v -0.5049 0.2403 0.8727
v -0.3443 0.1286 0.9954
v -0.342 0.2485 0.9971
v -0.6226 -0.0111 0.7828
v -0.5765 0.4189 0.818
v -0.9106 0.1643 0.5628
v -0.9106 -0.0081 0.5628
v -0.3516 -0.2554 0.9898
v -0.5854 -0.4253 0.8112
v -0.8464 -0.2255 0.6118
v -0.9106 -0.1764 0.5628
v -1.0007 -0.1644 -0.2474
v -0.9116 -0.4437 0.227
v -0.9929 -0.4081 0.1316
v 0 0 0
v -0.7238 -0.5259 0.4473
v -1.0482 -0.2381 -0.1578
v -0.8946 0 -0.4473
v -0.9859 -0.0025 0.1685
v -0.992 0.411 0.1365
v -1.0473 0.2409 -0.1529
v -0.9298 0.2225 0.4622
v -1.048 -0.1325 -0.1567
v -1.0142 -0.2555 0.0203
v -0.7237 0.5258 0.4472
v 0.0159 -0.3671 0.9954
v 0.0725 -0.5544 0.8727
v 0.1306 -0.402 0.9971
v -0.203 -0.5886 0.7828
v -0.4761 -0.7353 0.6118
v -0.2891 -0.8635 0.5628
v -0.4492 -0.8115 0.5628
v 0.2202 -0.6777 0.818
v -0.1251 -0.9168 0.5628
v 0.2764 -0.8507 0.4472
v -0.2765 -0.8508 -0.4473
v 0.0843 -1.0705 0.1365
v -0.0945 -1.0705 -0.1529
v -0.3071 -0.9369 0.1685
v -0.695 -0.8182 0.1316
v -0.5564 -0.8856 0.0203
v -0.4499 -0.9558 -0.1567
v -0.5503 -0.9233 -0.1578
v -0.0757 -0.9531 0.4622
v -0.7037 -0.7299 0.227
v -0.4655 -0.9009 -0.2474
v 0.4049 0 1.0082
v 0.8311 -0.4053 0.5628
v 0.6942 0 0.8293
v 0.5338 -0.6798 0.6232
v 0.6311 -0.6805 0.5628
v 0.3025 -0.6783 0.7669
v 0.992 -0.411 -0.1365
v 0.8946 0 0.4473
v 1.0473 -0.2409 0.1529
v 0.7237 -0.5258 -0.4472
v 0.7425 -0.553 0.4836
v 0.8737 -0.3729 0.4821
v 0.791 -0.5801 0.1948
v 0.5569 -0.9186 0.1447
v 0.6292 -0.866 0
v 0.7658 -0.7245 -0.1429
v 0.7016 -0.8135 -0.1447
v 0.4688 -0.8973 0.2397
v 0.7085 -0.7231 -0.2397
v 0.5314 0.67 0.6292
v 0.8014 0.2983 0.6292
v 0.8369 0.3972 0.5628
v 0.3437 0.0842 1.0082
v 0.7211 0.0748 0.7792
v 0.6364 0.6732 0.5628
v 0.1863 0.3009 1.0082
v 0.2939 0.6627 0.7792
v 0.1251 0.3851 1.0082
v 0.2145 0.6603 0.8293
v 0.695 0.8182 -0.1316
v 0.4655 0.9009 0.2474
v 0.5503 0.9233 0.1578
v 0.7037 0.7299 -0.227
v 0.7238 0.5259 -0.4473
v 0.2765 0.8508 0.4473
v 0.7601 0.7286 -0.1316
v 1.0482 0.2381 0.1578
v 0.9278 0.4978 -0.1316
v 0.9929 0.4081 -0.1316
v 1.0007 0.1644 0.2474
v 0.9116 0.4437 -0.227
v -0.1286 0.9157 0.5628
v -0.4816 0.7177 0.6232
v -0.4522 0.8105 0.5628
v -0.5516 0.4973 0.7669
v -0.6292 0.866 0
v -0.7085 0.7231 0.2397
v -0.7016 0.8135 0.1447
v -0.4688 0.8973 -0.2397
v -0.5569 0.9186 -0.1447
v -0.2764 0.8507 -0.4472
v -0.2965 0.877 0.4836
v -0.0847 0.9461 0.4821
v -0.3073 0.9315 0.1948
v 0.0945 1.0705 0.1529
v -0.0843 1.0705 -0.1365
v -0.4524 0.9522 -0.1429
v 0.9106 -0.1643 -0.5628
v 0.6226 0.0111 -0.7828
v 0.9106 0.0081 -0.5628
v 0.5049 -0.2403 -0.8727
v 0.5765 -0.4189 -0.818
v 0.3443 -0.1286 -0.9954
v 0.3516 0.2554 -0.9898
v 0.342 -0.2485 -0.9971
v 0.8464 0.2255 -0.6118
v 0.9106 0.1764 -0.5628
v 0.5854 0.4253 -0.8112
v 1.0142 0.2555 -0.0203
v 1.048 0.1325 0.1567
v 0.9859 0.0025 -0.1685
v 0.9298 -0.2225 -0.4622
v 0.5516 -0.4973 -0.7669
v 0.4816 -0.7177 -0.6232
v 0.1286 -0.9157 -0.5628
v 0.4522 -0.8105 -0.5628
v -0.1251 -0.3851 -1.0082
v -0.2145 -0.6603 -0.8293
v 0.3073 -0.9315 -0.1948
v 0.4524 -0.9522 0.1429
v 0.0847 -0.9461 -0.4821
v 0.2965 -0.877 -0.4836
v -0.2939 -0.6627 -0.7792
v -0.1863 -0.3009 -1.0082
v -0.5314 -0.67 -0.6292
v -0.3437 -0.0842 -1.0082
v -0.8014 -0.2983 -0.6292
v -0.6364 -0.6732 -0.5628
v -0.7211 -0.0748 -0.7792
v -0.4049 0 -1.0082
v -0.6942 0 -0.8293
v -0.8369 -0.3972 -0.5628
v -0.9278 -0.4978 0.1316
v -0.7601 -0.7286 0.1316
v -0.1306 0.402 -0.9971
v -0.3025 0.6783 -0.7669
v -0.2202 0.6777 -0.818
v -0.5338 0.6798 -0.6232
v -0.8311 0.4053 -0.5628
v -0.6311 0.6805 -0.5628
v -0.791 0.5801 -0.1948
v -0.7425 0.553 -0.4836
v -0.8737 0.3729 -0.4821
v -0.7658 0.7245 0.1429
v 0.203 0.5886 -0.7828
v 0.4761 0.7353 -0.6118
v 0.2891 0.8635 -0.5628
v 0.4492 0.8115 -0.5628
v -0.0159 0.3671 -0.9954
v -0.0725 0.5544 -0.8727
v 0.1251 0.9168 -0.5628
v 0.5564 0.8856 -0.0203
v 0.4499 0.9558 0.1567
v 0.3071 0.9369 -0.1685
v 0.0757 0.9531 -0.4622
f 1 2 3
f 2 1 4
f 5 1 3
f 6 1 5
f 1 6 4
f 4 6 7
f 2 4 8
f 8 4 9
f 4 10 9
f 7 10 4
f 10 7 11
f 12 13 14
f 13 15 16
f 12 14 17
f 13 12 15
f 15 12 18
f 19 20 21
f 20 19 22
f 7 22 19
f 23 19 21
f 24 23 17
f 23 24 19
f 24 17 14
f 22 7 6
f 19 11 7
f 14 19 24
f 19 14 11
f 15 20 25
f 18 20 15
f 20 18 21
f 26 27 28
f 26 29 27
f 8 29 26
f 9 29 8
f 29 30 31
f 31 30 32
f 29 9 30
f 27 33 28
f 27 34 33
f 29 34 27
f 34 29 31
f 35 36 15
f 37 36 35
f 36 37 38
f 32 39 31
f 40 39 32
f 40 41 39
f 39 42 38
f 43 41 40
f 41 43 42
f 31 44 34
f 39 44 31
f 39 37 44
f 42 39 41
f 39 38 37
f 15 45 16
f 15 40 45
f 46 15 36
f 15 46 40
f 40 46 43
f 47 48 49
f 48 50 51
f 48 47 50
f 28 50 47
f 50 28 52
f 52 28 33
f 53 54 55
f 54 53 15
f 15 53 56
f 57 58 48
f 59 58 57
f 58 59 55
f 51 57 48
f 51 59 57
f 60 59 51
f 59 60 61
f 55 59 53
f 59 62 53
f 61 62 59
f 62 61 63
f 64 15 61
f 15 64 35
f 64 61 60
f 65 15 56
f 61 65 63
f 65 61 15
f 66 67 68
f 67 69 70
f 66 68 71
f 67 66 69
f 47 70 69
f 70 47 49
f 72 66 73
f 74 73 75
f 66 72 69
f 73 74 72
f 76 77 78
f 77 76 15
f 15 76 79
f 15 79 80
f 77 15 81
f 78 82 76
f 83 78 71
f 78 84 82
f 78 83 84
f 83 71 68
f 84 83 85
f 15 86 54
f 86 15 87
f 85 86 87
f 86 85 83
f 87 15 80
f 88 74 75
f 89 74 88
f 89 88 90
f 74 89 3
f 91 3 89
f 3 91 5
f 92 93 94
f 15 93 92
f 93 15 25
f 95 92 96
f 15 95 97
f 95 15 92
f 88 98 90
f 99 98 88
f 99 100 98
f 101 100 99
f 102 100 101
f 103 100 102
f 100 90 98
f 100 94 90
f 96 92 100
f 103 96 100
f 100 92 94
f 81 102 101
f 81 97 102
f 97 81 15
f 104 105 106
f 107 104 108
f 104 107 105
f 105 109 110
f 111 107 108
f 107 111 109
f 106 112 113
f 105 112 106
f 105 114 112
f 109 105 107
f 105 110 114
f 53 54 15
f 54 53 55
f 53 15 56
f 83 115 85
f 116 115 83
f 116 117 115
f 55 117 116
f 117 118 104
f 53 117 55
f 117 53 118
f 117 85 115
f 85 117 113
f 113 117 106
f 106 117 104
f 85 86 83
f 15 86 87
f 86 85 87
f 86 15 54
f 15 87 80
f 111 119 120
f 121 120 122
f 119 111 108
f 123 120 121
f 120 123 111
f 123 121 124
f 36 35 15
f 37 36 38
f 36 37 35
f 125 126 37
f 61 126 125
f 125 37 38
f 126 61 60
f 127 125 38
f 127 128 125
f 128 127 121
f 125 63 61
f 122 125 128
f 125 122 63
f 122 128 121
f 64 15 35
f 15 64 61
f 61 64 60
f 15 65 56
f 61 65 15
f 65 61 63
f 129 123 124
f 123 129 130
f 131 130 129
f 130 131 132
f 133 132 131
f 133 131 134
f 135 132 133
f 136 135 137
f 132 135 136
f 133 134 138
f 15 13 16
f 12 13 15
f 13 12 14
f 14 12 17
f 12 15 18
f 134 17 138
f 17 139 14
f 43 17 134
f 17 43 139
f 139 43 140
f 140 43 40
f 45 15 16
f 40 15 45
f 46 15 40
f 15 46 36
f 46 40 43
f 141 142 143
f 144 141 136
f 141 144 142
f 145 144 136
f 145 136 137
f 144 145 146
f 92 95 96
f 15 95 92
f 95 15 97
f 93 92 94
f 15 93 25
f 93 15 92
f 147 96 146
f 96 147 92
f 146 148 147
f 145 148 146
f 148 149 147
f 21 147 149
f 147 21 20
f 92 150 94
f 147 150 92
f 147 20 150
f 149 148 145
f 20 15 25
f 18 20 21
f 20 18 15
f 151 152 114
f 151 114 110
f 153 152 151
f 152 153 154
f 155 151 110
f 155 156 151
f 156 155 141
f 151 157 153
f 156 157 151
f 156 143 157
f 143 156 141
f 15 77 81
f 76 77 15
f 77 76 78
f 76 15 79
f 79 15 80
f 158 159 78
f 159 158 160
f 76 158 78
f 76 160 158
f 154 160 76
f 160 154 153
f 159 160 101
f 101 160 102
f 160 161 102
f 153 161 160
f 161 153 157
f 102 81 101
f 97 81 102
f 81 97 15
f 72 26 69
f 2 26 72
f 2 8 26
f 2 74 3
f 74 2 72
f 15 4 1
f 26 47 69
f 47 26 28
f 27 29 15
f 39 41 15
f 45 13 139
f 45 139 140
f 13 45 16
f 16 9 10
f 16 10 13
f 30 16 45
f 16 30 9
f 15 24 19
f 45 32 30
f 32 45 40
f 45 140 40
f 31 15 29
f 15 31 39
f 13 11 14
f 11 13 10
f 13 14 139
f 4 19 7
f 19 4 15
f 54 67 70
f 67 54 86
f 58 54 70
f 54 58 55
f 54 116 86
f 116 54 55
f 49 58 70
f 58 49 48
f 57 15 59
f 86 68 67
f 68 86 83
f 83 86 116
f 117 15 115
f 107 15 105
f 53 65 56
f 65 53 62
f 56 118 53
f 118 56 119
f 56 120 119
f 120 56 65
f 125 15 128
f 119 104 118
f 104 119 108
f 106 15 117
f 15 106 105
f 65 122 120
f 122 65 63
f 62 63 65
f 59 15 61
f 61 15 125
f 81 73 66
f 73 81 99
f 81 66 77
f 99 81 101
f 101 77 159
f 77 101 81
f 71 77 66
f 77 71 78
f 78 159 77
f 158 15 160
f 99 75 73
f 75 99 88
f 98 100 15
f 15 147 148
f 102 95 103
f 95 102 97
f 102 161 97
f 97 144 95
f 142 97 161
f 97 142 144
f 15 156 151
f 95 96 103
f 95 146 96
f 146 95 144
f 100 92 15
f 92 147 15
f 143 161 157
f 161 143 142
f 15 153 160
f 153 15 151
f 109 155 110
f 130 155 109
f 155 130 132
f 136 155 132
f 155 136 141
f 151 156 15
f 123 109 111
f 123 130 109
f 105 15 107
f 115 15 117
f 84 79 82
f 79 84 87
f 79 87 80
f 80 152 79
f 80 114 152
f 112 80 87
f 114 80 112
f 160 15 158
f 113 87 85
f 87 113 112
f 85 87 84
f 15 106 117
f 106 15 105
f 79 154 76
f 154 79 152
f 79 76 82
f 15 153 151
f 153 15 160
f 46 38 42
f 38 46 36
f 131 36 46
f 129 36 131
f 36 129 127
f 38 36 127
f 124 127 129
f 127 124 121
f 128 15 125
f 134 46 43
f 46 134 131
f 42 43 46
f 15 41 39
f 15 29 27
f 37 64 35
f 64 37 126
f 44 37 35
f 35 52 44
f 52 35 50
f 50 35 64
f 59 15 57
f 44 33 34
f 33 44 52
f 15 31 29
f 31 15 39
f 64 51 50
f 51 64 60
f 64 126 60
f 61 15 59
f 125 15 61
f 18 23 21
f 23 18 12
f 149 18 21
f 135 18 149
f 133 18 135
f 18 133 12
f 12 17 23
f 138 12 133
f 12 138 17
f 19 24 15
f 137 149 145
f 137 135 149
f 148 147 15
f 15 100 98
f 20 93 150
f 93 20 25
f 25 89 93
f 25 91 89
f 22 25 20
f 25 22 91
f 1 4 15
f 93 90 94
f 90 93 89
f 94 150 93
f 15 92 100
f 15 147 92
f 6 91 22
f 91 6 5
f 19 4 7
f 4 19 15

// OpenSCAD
r = sqrt(3 / (1 + 2*sqrt(5)/5) - 1);
module f(n, m) {  // 5, 3: icosahedron; 3, 5: dodecahedron
for (j = [0, 180]) rotate([0, j, 0])
  for (i = [0:(n-1)]) rotate([0, 0, i * 360 / n])
    for (k = [0, 1]) rotate([0, -atan(r) - 2*k*atan(r*cos(180/m)), 0])
      rotate([0, 0, 180*k]) cylinder(1, 0, r, $fn=m);
}
intersection() {
  f(5, 3);
  rotate([0, 0, 36]) rotate([0, 36, 0]) f(3, 5);
}
